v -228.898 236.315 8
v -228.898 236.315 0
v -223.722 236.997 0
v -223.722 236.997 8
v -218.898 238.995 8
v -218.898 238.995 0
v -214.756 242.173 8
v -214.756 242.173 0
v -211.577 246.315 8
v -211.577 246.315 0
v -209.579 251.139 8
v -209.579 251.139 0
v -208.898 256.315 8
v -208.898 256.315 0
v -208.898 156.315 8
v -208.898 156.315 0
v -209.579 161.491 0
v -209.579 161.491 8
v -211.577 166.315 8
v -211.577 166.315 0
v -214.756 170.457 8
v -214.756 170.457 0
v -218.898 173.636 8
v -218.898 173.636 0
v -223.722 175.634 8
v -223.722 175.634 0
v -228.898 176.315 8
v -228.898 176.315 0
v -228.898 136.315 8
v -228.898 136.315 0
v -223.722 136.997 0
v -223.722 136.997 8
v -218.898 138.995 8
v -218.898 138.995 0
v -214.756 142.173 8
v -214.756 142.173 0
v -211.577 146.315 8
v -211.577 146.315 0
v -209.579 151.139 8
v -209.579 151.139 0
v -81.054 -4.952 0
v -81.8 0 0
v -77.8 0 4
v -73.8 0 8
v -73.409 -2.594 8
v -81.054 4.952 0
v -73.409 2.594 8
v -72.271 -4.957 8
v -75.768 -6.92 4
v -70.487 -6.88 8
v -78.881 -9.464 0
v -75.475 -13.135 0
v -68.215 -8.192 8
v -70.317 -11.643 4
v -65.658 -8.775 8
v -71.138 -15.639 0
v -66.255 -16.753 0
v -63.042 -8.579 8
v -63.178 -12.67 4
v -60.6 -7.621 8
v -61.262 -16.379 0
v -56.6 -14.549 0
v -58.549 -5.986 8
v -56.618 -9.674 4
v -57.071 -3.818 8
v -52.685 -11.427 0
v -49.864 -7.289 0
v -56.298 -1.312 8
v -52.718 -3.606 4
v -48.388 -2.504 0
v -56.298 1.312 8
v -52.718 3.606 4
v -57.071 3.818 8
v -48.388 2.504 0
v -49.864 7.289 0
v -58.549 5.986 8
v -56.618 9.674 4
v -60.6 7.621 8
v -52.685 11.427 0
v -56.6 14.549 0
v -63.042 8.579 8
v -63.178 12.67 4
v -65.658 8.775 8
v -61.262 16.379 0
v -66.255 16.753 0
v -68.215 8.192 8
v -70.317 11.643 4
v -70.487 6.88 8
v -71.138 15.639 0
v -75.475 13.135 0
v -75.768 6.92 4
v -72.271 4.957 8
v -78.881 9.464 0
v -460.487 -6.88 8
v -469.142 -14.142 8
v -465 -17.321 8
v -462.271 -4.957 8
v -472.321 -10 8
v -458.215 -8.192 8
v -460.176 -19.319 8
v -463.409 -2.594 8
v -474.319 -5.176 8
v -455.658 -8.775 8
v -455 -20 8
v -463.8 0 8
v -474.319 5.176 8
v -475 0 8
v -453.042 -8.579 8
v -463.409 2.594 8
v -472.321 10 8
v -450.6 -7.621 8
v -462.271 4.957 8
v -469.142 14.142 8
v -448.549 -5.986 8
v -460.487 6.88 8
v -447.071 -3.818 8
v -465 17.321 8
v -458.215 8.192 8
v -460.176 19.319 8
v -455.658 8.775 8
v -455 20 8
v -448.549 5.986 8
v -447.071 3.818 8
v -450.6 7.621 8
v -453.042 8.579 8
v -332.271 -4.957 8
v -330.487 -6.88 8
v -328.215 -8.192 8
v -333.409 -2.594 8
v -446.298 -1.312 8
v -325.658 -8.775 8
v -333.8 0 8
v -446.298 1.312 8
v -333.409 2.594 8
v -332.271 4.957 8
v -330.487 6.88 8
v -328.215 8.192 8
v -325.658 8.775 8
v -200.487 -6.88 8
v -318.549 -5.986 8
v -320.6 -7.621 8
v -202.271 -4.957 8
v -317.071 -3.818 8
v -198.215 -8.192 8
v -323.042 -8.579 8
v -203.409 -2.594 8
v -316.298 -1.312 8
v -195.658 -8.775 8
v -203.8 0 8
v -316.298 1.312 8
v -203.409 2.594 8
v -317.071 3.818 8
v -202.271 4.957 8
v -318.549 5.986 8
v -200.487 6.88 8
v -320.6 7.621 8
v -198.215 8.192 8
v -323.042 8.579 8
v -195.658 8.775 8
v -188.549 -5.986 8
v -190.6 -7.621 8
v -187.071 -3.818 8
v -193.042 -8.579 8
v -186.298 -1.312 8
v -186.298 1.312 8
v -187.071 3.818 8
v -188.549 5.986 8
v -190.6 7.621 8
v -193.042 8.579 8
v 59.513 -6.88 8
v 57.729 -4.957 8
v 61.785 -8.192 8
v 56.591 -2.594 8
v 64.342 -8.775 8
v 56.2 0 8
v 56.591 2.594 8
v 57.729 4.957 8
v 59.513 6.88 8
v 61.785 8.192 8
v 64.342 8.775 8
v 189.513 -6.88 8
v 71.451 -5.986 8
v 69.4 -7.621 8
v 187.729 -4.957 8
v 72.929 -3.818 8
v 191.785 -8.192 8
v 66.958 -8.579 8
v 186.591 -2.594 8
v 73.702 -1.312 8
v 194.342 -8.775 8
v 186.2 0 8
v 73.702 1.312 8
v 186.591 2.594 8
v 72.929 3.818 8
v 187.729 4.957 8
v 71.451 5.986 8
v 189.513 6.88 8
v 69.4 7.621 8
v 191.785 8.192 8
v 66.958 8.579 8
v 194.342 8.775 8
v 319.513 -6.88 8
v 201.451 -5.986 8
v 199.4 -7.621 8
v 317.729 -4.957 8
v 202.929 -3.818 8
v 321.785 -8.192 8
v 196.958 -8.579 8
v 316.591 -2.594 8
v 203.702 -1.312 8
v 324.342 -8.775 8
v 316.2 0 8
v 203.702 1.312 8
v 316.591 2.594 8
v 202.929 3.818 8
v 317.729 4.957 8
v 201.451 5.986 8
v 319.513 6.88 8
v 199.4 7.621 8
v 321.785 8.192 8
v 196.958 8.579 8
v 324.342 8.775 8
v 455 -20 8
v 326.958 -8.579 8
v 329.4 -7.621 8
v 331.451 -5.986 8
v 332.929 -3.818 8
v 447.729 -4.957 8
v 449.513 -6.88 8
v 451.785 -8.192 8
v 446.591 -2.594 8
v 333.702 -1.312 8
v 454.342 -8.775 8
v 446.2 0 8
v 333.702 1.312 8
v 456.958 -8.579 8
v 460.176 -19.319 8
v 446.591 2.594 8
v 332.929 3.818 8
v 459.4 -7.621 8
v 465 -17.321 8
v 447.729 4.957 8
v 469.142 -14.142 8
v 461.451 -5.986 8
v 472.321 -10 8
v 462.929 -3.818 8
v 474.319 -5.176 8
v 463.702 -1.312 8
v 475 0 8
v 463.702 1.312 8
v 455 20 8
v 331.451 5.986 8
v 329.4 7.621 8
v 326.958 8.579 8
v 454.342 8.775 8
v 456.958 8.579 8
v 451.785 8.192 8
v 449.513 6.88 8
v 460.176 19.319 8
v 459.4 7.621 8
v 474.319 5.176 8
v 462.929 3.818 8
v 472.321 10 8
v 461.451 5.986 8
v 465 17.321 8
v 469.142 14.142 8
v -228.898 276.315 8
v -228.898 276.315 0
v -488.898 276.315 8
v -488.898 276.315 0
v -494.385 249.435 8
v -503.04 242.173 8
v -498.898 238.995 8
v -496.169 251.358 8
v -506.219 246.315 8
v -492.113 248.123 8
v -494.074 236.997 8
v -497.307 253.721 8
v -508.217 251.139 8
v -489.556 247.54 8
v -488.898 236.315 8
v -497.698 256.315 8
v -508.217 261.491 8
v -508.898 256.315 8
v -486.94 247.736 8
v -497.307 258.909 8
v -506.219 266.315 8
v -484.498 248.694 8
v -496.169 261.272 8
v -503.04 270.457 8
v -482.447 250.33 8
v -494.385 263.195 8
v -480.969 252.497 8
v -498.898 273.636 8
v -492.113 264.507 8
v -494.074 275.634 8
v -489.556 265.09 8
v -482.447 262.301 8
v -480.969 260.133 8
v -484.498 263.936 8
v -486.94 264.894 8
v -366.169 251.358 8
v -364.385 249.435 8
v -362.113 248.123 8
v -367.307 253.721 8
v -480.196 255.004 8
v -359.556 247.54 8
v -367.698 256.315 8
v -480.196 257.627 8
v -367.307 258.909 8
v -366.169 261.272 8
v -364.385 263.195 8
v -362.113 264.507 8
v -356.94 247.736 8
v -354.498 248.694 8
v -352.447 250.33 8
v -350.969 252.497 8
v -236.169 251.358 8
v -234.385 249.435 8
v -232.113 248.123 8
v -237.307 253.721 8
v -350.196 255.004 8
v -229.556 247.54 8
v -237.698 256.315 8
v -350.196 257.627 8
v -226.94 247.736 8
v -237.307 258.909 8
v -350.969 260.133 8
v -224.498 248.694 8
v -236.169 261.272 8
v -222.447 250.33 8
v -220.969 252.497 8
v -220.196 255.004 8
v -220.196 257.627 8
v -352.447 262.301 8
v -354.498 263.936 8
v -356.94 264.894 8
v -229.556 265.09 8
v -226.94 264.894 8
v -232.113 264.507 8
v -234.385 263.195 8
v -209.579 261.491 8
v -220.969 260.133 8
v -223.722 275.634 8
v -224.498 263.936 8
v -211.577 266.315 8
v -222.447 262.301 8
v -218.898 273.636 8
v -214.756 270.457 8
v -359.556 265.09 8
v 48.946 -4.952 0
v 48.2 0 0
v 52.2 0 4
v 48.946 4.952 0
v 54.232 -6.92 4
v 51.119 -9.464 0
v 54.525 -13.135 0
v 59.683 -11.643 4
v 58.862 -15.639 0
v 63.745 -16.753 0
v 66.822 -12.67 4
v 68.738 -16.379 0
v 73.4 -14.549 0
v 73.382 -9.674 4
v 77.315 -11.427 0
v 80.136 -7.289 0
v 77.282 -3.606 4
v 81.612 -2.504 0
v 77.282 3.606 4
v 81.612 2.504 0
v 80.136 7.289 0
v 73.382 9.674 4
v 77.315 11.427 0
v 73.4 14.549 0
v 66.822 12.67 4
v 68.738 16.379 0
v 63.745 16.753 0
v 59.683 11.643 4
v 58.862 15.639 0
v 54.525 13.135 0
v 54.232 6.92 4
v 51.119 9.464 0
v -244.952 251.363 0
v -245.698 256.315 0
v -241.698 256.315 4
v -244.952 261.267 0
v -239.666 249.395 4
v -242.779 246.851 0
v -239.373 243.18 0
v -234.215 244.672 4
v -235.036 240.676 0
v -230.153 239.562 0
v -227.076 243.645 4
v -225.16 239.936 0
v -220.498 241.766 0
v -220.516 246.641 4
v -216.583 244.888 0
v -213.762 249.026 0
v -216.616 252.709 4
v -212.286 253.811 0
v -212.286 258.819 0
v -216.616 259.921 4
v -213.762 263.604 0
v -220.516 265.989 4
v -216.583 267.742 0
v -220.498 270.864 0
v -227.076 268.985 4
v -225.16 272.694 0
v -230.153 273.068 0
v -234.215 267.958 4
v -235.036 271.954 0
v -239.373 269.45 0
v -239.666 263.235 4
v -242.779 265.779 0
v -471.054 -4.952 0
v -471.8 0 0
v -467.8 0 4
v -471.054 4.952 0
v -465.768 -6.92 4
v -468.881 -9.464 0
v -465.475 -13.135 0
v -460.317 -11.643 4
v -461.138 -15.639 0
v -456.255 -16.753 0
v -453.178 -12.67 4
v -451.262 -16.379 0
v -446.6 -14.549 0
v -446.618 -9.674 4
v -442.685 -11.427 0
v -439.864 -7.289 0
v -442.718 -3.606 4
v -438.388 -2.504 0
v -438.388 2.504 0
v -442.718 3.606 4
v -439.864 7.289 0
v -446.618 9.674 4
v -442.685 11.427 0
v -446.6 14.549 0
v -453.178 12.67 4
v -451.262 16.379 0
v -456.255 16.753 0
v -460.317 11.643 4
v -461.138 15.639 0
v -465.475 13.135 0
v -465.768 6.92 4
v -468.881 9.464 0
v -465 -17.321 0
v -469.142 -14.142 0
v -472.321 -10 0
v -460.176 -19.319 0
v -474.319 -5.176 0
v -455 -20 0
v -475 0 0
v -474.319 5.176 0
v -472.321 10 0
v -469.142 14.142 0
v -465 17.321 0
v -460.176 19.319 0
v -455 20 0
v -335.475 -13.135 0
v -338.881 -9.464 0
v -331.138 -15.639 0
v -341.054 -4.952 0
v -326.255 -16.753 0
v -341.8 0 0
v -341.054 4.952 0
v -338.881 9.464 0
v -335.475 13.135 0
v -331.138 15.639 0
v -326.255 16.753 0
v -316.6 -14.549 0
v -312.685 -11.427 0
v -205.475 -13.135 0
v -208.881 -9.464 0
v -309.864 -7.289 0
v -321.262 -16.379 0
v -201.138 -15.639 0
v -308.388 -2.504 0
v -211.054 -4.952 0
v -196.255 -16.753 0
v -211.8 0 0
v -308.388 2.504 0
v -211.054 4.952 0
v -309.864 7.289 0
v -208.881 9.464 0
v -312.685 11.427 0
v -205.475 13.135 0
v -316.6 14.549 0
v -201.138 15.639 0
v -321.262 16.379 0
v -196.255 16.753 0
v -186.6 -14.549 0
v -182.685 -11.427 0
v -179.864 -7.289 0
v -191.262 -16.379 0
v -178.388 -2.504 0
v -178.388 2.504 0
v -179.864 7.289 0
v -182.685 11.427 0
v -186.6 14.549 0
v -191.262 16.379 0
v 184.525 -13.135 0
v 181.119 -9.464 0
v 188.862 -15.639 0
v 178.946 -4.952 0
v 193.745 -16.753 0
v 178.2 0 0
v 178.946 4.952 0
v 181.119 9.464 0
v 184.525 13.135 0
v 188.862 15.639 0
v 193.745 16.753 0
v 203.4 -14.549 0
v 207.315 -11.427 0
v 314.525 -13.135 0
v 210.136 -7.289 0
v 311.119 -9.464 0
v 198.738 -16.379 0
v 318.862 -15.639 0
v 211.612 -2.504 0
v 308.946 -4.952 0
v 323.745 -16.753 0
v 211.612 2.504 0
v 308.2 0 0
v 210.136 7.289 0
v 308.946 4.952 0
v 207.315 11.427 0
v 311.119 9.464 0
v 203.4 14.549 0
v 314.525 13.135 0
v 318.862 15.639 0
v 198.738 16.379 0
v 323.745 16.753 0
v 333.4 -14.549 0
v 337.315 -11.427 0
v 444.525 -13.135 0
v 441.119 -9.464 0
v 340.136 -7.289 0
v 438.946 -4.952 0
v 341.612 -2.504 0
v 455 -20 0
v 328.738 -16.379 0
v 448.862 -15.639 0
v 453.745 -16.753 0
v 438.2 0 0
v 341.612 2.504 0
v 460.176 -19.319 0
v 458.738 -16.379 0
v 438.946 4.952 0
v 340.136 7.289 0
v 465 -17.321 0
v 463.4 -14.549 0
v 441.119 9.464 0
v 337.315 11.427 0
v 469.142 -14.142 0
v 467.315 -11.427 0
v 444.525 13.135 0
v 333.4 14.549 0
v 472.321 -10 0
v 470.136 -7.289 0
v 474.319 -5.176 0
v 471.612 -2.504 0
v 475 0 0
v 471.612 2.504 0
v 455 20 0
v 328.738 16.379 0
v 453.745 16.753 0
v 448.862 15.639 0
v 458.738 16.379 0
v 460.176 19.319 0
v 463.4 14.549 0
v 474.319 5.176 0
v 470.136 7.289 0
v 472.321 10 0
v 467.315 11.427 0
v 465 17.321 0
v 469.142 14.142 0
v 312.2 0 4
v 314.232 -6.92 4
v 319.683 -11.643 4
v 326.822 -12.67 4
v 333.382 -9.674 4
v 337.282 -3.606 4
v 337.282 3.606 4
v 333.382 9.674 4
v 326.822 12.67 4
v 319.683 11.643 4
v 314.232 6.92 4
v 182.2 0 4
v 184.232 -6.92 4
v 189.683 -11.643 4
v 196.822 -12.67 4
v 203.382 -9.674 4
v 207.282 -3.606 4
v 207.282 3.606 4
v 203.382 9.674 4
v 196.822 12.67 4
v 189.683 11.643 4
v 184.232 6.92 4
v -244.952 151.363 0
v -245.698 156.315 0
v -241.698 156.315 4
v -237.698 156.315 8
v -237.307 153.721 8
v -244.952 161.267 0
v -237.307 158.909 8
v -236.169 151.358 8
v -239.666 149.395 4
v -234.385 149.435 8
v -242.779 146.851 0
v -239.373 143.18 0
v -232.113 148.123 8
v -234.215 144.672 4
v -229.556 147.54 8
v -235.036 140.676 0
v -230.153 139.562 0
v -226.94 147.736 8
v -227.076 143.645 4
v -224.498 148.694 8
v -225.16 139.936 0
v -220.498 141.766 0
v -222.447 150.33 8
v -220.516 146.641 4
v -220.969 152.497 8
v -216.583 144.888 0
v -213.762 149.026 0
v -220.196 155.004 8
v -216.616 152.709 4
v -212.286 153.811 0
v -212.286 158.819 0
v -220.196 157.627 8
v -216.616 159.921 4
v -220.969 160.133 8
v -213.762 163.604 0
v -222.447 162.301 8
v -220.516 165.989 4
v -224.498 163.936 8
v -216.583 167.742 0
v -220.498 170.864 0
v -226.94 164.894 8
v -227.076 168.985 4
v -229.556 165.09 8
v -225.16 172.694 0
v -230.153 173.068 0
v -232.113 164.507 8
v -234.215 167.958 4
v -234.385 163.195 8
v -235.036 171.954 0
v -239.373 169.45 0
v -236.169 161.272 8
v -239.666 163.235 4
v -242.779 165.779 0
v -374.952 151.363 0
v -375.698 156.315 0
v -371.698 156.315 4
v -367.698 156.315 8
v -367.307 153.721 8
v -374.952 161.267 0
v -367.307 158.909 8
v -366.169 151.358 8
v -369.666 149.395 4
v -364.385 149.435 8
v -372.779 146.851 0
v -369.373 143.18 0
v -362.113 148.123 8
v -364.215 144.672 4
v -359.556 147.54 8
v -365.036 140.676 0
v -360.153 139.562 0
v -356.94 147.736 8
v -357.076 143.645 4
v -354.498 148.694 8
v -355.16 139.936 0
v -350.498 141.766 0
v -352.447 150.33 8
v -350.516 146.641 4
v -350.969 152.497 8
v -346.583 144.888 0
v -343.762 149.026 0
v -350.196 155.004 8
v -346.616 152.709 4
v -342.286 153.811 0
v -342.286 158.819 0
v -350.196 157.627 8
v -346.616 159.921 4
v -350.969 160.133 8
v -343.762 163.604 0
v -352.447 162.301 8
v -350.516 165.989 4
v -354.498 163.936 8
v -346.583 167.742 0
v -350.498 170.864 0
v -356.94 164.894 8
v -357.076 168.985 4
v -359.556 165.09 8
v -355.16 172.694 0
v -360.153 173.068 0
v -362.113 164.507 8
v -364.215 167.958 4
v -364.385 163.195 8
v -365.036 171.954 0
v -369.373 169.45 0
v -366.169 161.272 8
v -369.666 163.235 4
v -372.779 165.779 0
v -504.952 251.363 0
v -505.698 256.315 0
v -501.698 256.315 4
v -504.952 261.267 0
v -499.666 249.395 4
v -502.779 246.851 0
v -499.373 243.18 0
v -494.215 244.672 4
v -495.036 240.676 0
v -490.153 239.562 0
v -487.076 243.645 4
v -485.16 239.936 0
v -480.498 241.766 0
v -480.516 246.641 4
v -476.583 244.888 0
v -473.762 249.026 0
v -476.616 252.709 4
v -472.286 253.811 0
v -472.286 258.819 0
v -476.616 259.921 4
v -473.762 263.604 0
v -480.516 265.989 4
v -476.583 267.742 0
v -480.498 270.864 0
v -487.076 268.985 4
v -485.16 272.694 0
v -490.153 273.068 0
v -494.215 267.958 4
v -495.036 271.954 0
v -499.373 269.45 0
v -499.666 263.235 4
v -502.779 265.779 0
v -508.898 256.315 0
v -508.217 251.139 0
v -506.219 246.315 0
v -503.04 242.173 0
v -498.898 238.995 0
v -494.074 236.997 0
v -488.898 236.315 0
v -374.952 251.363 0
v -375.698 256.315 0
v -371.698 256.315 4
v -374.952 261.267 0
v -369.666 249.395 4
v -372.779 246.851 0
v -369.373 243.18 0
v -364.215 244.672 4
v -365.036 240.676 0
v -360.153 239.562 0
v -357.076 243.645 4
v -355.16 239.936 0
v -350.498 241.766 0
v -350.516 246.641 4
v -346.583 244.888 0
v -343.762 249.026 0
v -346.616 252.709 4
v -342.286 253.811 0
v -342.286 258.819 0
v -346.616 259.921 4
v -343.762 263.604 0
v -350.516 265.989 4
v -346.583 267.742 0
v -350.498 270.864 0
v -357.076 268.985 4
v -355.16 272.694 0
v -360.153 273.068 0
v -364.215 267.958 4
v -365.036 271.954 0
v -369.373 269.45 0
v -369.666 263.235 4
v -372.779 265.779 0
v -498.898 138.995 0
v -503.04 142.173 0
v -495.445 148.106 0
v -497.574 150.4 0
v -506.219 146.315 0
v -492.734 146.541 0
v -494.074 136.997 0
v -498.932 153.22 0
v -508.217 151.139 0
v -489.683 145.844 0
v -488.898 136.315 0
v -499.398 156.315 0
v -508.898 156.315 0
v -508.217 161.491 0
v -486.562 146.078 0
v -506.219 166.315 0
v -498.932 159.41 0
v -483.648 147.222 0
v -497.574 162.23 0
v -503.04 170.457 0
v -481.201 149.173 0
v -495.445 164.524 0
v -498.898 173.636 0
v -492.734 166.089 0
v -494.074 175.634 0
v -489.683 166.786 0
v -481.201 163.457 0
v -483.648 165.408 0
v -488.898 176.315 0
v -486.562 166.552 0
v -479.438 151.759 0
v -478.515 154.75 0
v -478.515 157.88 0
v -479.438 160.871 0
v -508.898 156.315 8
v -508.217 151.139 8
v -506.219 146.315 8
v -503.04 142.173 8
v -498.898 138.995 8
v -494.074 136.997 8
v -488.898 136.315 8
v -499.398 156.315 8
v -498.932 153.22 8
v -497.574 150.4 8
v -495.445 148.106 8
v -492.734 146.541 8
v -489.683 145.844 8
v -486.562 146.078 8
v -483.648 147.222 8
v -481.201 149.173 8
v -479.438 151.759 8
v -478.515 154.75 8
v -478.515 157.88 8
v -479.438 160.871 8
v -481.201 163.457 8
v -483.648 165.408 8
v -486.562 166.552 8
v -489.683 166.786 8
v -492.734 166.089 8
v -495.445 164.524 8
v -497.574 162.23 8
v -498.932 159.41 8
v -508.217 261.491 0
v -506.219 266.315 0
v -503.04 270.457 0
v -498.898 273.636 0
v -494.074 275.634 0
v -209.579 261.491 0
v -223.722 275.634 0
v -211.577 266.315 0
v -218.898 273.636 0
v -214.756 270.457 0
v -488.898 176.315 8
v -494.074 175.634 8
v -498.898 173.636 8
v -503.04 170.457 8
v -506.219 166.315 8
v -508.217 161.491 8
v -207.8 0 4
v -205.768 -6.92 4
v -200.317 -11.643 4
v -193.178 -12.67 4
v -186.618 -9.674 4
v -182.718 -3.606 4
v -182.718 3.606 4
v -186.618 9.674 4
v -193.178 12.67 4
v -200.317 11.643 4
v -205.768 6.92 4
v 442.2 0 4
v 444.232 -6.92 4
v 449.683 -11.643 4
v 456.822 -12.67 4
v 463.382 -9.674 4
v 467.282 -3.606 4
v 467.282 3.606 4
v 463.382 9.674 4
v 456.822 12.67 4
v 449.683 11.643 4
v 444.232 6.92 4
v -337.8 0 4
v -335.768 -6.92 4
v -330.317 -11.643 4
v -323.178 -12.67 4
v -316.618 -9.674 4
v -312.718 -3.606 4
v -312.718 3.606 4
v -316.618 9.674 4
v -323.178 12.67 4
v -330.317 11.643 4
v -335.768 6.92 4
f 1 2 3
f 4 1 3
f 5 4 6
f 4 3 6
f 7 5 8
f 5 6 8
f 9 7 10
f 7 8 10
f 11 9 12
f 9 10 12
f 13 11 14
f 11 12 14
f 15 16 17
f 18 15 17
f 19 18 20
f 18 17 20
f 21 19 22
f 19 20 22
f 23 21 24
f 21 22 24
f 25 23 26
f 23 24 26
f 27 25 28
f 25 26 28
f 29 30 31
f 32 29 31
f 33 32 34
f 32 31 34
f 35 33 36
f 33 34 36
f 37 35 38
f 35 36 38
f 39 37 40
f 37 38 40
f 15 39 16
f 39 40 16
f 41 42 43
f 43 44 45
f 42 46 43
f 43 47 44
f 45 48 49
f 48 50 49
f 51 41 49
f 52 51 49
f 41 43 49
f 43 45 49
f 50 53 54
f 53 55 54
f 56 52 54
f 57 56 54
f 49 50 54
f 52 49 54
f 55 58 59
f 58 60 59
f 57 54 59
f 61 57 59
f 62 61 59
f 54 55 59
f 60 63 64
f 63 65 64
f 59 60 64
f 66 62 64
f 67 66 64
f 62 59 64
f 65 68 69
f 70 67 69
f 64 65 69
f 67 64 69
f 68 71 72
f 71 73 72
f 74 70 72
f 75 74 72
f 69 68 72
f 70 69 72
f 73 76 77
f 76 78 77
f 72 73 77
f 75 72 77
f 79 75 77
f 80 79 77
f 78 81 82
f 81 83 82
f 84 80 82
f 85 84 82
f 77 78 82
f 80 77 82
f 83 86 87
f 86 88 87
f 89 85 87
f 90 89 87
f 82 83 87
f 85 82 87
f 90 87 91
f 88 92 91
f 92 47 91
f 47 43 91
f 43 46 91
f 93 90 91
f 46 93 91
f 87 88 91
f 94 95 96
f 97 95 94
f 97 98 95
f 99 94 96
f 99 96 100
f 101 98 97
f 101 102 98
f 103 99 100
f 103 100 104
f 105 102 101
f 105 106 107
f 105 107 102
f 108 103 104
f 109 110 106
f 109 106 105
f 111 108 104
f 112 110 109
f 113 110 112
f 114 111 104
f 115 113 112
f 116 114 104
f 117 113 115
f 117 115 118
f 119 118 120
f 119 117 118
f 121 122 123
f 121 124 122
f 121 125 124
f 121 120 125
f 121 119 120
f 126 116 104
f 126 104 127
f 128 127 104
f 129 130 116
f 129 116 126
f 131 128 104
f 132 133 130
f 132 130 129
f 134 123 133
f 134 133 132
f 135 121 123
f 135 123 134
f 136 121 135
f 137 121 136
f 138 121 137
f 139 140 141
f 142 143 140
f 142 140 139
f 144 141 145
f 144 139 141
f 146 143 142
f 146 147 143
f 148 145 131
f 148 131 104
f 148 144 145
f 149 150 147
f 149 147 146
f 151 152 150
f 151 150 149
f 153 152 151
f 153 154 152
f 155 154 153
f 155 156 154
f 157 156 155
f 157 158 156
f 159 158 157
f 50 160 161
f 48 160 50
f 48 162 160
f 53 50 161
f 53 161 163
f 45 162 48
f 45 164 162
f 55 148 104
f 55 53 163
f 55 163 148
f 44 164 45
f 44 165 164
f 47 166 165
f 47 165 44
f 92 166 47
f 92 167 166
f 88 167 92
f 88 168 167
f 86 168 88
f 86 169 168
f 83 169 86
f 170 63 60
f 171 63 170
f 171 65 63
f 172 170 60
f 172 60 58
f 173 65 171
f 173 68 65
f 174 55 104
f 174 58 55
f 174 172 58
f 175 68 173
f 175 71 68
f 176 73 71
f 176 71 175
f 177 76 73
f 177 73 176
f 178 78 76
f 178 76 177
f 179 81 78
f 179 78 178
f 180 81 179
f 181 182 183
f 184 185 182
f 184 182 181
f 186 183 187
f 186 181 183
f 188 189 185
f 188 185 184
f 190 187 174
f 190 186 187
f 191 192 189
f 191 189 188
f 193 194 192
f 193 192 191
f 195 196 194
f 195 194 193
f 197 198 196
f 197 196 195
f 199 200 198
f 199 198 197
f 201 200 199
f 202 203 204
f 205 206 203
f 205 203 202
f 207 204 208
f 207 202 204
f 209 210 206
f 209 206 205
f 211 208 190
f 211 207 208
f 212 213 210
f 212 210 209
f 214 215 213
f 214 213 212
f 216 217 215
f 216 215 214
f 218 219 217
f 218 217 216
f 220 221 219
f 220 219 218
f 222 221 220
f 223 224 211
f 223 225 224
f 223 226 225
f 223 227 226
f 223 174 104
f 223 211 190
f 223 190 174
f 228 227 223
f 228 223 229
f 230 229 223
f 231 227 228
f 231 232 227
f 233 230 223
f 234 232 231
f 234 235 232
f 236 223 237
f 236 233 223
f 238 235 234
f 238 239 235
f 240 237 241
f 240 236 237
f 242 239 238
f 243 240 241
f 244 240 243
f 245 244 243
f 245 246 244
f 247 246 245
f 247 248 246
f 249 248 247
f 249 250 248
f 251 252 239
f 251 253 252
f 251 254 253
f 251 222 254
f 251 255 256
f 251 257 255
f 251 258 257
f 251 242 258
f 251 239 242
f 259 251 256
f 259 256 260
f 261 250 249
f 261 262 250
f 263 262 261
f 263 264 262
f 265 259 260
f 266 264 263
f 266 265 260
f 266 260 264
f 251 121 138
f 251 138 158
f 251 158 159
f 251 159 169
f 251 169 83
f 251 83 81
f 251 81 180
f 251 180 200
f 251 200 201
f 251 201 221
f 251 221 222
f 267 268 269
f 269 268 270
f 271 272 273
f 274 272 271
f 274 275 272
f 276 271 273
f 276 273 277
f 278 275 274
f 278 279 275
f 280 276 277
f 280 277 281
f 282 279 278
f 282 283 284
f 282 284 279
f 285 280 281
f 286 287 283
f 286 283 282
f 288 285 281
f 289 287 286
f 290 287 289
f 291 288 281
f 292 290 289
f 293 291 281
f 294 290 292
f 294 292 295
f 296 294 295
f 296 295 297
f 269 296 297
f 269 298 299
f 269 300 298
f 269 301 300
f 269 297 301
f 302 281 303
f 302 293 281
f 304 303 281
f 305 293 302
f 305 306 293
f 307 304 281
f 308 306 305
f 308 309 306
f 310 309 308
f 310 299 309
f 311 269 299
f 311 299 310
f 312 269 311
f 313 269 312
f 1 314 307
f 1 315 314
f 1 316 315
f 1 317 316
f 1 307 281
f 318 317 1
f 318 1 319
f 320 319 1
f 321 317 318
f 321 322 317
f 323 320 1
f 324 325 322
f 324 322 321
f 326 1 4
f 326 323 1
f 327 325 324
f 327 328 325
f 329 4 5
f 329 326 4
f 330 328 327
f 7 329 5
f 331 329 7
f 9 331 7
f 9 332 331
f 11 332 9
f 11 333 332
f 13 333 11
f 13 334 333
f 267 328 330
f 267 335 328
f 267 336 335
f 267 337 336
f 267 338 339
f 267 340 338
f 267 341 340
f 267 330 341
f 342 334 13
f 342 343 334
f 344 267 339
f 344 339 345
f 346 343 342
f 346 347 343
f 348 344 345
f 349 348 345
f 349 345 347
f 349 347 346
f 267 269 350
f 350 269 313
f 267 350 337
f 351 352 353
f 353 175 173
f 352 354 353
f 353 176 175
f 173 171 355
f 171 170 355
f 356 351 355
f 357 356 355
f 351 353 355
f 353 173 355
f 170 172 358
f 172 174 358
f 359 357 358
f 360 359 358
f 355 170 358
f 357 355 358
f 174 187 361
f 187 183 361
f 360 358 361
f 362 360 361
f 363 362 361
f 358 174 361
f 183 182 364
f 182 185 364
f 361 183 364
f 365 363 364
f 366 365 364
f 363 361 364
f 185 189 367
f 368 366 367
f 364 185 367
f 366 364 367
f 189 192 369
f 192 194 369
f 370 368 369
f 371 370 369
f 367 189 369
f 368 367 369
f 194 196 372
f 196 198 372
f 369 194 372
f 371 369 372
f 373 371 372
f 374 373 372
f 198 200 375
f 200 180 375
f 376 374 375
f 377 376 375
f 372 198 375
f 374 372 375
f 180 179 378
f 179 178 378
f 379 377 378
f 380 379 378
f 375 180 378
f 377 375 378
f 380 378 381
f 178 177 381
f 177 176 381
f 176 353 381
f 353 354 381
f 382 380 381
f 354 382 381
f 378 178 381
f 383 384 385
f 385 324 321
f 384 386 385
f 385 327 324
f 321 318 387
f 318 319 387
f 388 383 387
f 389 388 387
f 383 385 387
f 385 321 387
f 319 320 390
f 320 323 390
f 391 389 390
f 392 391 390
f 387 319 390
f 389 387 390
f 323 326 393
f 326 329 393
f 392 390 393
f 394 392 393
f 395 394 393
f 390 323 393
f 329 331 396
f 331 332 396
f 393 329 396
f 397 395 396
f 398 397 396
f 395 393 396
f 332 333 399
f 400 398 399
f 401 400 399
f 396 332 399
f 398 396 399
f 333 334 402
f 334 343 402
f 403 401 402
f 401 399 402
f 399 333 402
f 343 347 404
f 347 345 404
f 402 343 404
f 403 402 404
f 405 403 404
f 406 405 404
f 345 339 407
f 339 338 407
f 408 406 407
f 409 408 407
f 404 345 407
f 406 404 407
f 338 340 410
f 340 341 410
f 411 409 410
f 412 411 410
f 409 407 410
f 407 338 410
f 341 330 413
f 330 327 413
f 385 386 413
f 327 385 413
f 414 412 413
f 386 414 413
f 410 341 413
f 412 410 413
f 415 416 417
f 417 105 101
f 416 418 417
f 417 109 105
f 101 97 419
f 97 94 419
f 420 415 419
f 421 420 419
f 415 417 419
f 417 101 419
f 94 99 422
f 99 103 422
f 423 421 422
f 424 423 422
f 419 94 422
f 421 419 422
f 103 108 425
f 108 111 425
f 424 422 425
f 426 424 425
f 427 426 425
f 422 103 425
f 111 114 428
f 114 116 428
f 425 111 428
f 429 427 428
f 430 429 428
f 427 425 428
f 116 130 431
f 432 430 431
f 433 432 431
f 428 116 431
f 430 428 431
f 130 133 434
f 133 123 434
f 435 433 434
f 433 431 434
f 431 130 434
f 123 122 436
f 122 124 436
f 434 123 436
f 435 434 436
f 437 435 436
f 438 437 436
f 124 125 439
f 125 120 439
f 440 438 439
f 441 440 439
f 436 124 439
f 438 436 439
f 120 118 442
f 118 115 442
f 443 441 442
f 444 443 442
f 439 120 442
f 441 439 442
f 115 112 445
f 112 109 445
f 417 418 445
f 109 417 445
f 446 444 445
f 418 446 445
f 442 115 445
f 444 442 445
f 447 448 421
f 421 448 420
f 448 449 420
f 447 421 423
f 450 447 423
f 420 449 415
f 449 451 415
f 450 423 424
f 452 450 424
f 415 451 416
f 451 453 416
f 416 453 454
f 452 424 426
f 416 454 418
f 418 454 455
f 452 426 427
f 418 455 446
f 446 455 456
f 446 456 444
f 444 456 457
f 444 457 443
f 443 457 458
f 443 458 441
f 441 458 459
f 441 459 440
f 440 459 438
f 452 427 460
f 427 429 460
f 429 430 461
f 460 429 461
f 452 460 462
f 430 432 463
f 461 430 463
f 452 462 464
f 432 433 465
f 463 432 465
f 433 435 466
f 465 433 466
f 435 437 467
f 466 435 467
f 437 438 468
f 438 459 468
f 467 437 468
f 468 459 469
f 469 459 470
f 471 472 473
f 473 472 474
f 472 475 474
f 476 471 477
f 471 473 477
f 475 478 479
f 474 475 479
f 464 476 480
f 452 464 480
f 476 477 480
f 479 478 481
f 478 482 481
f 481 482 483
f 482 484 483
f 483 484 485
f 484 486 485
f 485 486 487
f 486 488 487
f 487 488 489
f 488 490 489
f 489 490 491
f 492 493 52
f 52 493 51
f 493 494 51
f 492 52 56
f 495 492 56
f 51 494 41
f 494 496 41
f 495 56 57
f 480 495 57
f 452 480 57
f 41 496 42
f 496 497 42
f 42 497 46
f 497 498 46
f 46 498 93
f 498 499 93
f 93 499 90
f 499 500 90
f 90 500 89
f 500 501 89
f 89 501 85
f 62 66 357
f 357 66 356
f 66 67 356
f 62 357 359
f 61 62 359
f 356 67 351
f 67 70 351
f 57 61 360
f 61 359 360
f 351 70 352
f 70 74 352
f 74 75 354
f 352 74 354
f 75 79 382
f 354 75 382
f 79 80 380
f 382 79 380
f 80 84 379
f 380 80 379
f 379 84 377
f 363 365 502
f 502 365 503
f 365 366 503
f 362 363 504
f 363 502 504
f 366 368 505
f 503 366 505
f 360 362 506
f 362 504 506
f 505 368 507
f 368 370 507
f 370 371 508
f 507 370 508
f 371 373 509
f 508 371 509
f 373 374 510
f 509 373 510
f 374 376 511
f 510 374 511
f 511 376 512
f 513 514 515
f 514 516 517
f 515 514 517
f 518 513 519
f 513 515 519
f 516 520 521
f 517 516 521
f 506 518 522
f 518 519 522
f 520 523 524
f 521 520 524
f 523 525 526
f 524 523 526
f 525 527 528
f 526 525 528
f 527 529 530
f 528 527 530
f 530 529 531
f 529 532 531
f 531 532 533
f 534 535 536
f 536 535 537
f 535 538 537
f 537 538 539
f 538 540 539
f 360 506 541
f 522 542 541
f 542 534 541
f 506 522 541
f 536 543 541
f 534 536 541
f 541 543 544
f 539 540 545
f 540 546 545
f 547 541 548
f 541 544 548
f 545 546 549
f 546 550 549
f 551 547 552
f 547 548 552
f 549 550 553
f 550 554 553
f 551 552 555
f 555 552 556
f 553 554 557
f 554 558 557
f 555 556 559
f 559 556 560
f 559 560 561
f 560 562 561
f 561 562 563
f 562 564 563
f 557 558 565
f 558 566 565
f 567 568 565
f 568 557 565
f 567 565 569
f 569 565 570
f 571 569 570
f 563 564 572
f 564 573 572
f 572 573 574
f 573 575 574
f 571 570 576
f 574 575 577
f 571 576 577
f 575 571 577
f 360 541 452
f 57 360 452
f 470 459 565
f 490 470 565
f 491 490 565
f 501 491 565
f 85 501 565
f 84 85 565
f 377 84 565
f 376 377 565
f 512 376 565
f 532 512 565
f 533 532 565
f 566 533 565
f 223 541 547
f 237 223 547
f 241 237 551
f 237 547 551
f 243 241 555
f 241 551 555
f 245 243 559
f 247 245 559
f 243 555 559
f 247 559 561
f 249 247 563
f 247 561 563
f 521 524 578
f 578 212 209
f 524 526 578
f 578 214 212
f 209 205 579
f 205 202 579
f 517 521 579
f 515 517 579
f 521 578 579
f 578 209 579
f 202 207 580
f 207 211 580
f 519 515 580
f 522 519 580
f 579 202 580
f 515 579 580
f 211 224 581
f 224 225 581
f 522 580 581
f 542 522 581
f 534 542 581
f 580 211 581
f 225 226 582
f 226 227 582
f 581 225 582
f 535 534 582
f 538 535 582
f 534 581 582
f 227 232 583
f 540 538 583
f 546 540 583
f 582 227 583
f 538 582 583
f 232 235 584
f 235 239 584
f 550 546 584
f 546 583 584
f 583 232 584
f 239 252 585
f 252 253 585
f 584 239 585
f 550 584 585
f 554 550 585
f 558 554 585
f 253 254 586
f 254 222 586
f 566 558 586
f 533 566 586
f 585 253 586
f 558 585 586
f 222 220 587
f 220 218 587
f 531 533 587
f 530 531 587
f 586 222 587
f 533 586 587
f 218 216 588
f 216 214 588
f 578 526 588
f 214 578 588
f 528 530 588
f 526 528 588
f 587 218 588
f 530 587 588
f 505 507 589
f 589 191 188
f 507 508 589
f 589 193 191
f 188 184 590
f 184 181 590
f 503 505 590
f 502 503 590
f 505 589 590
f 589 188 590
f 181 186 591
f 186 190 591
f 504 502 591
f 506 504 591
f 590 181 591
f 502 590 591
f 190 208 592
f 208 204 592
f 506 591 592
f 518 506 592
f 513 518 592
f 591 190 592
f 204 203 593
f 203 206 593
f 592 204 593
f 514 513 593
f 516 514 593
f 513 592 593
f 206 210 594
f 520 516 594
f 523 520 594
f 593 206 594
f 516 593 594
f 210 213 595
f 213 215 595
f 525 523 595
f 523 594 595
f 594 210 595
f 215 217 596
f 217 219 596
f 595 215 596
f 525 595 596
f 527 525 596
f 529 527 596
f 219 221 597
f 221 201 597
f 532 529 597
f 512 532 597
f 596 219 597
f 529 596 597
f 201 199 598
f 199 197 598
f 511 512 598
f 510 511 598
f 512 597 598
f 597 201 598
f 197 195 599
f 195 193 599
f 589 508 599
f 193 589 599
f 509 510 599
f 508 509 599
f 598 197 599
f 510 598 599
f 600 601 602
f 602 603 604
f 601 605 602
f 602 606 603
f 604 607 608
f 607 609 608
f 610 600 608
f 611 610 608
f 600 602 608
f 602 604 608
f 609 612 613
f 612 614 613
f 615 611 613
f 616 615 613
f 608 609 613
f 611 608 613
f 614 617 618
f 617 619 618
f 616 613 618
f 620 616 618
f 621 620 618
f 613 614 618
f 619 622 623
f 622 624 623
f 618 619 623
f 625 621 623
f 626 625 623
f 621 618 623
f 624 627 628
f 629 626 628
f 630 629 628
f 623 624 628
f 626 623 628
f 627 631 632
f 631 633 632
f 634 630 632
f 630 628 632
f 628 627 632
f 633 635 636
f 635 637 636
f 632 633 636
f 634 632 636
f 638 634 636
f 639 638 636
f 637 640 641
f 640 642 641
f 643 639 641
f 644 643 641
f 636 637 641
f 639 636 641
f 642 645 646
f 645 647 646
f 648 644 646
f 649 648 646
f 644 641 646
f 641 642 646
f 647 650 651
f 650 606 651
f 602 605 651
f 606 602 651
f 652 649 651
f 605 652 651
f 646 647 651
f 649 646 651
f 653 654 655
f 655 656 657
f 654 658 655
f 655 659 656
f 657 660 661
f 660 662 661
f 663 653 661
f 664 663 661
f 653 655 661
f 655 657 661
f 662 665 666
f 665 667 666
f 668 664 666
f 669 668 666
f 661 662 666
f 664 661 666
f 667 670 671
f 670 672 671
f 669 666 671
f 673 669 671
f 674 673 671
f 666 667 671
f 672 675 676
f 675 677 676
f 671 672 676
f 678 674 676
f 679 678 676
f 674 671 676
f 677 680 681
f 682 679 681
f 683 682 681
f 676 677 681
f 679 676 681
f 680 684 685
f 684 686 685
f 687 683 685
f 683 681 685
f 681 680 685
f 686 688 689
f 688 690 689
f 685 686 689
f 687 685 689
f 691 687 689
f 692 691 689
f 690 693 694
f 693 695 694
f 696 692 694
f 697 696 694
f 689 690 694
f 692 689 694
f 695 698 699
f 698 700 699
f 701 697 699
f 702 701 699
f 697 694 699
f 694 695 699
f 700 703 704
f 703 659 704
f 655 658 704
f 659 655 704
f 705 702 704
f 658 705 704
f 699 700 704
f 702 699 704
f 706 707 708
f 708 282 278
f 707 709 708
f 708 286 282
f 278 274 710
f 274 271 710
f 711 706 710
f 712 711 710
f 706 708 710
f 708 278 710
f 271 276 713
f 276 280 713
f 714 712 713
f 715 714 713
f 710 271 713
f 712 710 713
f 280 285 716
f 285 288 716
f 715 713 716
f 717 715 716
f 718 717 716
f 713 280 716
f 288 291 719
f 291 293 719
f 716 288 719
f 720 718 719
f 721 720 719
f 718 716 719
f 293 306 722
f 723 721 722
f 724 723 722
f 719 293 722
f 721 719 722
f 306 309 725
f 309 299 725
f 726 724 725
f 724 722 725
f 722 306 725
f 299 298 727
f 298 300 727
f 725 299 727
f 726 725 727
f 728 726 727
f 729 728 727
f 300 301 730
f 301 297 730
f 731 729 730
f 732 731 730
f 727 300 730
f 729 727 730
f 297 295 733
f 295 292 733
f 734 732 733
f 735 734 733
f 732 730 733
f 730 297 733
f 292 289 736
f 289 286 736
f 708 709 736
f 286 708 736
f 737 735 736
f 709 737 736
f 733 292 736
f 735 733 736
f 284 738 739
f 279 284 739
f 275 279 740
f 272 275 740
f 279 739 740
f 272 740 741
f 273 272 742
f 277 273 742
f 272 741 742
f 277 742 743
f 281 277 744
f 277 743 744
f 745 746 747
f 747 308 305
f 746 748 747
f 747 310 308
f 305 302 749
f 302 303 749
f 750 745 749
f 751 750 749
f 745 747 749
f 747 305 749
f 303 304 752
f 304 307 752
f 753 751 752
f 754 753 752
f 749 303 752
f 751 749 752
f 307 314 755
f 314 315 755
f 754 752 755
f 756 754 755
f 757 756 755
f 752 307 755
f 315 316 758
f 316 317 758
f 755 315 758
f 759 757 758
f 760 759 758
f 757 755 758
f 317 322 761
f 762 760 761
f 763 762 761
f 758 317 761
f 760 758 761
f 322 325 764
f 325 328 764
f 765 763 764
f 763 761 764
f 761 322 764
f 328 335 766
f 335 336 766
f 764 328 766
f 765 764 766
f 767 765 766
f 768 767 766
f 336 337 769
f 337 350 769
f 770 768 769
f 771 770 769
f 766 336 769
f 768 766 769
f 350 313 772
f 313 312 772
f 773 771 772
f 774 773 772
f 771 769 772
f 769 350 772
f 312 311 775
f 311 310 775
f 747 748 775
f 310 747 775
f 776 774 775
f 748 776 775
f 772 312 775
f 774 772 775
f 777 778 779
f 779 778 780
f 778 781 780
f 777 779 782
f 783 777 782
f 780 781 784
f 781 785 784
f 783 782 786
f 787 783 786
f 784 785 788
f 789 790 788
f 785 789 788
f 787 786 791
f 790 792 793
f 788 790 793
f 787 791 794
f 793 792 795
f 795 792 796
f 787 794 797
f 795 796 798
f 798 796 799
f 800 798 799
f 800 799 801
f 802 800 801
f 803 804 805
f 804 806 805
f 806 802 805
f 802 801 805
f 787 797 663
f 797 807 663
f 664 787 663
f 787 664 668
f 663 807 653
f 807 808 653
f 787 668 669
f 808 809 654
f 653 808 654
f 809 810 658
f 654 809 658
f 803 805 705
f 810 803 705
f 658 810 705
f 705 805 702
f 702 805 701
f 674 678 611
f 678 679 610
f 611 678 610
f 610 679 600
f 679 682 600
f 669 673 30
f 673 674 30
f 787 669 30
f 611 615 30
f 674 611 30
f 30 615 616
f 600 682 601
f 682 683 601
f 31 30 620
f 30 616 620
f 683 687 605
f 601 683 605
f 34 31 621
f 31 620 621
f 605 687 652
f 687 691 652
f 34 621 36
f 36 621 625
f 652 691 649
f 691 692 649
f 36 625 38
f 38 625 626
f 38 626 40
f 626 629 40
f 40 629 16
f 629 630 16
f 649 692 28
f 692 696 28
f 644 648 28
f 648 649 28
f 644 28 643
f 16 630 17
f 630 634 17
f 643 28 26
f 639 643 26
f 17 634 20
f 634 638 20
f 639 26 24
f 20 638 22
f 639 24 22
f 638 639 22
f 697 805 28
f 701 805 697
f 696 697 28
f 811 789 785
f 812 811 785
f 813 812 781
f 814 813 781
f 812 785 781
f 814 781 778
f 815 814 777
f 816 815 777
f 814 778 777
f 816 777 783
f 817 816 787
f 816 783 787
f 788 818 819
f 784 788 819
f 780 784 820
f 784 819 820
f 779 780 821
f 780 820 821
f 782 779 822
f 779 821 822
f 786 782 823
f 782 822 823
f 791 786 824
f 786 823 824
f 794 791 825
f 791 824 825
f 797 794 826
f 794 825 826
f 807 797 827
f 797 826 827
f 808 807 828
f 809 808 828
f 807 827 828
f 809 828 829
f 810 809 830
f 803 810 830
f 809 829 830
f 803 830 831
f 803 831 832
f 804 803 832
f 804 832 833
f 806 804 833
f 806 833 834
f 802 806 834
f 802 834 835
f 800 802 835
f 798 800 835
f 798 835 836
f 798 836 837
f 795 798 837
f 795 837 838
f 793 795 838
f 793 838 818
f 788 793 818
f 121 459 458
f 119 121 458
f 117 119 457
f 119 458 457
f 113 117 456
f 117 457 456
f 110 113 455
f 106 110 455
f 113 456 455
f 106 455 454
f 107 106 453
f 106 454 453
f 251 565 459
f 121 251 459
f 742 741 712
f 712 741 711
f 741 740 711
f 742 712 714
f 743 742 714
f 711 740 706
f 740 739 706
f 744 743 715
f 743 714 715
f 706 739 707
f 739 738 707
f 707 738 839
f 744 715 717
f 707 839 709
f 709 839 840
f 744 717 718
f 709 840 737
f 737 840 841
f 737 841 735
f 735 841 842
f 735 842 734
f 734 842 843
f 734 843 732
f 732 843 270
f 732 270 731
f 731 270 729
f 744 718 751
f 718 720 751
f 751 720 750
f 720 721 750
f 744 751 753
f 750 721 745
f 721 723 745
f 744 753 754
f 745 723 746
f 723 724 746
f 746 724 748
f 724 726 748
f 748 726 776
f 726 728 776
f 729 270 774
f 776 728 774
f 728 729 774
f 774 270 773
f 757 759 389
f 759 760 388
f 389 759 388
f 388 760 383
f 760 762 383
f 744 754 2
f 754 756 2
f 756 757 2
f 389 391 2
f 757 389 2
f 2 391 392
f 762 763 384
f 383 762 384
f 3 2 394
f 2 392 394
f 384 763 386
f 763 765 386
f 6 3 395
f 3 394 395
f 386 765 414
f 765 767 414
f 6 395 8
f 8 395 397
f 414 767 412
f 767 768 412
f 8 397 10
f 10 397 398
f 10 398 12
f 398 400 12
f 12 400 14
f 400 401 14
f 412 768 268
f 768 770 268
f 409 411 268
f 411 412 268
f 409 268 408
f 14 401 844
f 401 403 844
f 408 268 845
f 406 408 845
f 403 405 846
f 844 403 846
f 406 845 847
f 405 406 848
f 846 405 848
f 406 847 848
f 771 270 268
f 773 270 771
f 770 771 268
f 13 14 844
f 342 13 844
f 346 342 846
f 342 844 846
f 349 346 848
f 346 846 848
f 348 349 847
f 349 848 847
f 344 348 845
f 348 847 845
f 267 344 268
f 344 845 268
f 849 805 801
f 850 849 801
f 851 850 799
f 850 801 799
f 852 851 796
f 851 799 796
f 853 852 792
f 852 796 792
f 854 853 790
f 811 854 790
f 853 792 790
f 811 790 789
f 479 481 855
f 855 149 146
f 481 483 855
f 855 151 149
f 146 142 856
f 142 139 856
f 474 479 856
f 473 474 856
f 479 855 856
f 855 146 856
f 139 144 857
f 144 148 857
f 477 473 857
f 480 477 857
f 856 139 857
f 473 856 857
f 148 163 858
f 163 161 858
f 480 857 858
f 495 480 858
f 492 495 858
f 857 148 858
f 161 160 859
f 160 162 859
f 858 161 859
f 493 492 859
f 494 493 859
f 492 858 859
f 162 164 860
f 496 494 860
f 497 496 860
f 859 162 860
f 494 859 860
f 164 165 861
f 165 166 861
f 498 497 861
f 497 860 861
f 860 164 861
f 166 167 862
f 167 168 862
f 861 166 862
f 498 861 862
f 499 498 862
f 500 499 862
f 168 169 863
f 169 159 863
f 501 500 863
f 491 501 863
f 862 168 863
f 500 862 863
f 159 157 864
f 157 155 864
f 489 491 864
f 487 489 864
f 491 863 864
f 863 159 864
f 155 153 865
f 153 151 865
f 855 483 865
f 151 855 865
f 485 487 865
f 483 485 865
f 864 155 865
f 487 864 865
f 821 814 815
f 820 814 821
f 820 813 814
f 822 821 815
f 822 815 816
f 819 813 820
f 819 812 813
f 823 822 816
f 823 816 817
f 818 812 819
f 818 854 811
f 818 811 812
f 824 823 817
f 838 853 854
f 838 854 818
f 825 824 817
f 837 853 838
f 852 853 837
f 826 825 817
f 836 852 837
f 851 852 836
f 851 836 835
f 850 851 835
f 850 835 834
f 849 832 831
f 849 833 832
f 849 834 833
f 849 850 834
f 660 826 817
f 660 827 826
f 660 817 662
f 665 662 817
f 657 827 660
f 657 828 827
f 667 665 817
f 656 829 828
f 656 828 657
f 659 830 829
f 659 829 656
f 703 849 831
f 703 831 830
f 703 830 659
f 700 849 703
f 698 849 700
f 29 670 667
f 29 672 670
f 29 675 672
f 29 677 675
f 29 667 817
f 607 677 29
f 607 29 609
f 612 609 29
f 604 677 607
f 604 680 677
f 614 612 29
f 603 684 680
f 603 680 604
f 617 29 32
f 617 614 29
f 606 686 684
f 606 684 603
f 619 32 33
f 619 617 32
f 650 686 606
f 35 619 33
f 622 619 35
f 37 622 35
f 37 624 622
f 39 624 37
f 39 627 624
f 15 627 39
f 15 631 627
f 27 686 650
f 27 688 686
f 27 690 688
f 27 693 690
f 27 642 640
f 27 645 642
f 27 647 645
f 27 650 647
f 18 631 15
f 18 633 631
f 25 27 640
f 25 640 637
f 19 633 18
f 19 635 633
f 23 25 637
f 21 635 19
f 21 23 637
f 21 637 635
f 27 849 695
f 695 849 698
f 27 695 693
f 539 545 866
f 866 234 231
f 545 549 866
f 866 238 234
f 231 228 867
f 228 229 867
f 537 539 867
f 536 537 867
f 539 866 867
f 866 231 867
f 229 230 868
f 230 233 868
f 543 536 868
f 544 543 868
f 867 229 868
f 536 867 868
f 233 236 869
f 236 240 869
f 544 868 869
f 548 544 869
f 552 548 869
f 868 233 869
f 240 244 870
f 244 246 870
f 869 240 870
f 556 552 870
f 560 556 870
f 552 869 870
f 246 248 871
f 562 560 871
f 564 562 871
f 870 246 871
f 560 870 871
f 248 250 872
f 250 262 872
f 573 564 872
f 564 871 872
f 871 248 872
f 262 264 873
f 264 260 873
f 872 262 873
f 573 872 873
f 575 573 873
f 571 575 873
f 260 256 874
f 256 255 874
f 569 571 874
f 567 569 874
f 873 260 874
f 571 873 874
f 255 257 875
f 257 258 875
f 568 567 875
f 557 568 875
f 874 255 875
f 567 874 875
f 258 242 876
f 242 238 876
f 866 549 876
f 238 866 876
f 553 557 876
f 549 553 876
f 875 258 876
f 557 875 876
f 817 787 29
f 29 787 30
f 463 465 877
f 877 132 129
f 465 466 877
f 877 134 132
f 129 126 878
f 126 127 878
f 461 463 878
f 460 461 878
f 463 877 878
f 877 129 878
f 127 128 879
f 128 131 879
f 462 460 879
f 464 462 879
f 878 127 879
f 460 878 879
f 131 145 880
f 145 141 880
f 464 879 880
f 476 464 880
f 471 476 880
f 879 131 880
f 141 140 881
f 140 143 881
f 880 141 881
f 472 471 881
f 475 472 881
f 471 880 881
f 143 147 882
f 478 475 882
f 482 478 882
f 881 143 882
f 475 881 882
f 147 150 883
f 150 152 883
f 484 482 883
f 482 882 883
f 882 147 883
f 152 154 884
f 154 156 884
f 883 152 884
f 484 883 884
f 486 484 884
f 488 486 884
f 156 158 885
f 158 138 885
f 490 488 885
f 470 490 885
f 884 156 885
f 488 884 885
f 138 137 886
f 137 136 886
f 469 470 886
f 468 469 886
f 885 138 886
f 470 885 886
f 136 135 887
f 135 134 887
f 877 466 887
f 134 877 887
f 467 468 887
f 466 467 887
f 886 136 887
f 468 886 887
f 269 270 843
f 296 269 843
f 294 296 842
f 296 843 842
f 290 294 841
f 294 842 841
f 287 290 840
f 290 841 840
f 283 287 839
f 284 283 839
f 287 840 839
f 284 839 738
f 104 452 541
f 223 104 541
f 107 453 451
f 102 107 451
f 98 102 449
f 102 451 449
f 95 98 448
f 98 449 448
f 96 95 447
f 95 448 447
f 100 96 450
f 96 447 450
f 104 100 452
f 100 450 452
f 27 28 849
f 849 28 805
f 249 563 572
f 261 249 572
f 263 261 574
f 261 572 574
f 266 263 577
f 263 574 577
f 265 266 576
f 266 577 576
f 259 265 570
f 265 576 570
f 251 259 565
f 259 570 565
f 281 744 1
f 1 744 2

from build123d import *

# Parameters (mm, degrees)
F1_DEPTH        = 8
F3_D            = 17.5
F3_CSINK_D      = 33.6
F3_CSINK_ANGLE  = 90
F5_DEPTH        = 8
F7_D            = 17.5
F7_CSINK_D      = 33.6
F7_CSINK_ANGLE  = 90
F9_D            = 21
F11_D           = 17.5
F11_CSINK_D     = 33.6
F11_CSINK_ANGLE = 90


with BuildPart() as f1:
    # F0 (on Top) → F1 (new body)
    with BuildSketch(Plane.XY):
        with BuildLine():
            Line((-455, -20), (455, -20))
            ThreePointArc((455, -20), (469.1421356237, -14.1421356237), (475, 0))
            ThreePointArc((475, 0), (469.1421356237, 14.1421356237), (455, 20))
            Line((455, 20), (-455, 20))
            ThreePointArc((-455, 20), (-469.1421356237, 14.1421356237), (-475, 0))
            ThreePointArc((-475, 0), (-469.1421356237, -14.1421356237), (-455, -20))
        make_face()
    extrude(amount=F1_DEPTH)

    # F3 (through all)
    with Locations(Plane(origin=(0, 0, 0), x_dir=(1, 0, 0), z_dir=(0, 0, -1))):
        with Locations((-455, 0), (-325, 0), (-195, 0), (-65, 0), (65, 0), (195, 0), (325, 0), (455, 0)):
            CounterSinkHole(F3_D / 2, F3_CSINK_D / 2, counter_sink_angle=F3_CSINK_ANGLE)


with BuildPart() as f5:
    # F4 (on Top) → F5 (new body)
    with BuildSketch(Plane.XY):
        with BuildLine():
            Line((-488.89799788, 136.3150814176), (-228.89799788, 136.3150814176))
            ThreePointArc((-228.89799788, 136.3150814176), (-214.7558622562, 142.1729457938), (-208.89799788, 156.3150814176))
            ThreePointArc((-208.89799788, 156.3150814176), (-214.7558622562, 170.4572170413), (-228.89799788, 176.3150814176))
            Line((-228.89799788, 176.3150814176), (-488.89799788, 176.3150814176))
            ThreePointArc((-488.89799788, 176.3150814176), (-503.0401335037, 170.4572170413), (-508.89799788, 156.3150814176))
            ThreePointArc((-508.89799788, 156.3150814176), (-503.0401335037, 142.1729457938), (-488.89799788, 136.3150814176))
        make_face()
    extrude(amount=F5_DEPTH)

    # F7 (through all)
    with Locations(Plane(origin=(0, 0, 0), x_dir=(1, 0, 0), z_dir=(0, 0, -1))):
        with Locations((-358.89799788, -156.3150814176), (-228.89799788, -156.3150814176)):
            CounterSinkHole(F7_D / 2, F7_CSINK_D / 2, counter_sink_angle=F7_CSINK_ANGLE)


with BuildPart() as f8_1:
    # F8: copy of F5
    add(f5.part.moved(Location((0, 100, 0))))

    # F11 (through all)
    with Locations(Plane(origin=(0, 0, 0), x_dir=(1, 0, 0), z_dir=(0, 0, -1))):
        with Locations((-488.89799788, -256.3150814176)):
            CounterSinkHole(F11_D / 2, F11_CSINK_D / 2, counter_sink_angle=F11_CSINK_ANGLE)


with BuildPart() as f5_1:
    add(f5.part)

    # F9 (through all)
    with Locations(Plane(origin=(0, 0, 0), x_dir=(1, 0, 0), z_dir=(0, 0, -1))):
        with Locations((-488.89799788, -156.3150814176)):
            Hole(F9_D / 2)


solid = Compound([f1.part, f8_1.part, f5_1.part])
